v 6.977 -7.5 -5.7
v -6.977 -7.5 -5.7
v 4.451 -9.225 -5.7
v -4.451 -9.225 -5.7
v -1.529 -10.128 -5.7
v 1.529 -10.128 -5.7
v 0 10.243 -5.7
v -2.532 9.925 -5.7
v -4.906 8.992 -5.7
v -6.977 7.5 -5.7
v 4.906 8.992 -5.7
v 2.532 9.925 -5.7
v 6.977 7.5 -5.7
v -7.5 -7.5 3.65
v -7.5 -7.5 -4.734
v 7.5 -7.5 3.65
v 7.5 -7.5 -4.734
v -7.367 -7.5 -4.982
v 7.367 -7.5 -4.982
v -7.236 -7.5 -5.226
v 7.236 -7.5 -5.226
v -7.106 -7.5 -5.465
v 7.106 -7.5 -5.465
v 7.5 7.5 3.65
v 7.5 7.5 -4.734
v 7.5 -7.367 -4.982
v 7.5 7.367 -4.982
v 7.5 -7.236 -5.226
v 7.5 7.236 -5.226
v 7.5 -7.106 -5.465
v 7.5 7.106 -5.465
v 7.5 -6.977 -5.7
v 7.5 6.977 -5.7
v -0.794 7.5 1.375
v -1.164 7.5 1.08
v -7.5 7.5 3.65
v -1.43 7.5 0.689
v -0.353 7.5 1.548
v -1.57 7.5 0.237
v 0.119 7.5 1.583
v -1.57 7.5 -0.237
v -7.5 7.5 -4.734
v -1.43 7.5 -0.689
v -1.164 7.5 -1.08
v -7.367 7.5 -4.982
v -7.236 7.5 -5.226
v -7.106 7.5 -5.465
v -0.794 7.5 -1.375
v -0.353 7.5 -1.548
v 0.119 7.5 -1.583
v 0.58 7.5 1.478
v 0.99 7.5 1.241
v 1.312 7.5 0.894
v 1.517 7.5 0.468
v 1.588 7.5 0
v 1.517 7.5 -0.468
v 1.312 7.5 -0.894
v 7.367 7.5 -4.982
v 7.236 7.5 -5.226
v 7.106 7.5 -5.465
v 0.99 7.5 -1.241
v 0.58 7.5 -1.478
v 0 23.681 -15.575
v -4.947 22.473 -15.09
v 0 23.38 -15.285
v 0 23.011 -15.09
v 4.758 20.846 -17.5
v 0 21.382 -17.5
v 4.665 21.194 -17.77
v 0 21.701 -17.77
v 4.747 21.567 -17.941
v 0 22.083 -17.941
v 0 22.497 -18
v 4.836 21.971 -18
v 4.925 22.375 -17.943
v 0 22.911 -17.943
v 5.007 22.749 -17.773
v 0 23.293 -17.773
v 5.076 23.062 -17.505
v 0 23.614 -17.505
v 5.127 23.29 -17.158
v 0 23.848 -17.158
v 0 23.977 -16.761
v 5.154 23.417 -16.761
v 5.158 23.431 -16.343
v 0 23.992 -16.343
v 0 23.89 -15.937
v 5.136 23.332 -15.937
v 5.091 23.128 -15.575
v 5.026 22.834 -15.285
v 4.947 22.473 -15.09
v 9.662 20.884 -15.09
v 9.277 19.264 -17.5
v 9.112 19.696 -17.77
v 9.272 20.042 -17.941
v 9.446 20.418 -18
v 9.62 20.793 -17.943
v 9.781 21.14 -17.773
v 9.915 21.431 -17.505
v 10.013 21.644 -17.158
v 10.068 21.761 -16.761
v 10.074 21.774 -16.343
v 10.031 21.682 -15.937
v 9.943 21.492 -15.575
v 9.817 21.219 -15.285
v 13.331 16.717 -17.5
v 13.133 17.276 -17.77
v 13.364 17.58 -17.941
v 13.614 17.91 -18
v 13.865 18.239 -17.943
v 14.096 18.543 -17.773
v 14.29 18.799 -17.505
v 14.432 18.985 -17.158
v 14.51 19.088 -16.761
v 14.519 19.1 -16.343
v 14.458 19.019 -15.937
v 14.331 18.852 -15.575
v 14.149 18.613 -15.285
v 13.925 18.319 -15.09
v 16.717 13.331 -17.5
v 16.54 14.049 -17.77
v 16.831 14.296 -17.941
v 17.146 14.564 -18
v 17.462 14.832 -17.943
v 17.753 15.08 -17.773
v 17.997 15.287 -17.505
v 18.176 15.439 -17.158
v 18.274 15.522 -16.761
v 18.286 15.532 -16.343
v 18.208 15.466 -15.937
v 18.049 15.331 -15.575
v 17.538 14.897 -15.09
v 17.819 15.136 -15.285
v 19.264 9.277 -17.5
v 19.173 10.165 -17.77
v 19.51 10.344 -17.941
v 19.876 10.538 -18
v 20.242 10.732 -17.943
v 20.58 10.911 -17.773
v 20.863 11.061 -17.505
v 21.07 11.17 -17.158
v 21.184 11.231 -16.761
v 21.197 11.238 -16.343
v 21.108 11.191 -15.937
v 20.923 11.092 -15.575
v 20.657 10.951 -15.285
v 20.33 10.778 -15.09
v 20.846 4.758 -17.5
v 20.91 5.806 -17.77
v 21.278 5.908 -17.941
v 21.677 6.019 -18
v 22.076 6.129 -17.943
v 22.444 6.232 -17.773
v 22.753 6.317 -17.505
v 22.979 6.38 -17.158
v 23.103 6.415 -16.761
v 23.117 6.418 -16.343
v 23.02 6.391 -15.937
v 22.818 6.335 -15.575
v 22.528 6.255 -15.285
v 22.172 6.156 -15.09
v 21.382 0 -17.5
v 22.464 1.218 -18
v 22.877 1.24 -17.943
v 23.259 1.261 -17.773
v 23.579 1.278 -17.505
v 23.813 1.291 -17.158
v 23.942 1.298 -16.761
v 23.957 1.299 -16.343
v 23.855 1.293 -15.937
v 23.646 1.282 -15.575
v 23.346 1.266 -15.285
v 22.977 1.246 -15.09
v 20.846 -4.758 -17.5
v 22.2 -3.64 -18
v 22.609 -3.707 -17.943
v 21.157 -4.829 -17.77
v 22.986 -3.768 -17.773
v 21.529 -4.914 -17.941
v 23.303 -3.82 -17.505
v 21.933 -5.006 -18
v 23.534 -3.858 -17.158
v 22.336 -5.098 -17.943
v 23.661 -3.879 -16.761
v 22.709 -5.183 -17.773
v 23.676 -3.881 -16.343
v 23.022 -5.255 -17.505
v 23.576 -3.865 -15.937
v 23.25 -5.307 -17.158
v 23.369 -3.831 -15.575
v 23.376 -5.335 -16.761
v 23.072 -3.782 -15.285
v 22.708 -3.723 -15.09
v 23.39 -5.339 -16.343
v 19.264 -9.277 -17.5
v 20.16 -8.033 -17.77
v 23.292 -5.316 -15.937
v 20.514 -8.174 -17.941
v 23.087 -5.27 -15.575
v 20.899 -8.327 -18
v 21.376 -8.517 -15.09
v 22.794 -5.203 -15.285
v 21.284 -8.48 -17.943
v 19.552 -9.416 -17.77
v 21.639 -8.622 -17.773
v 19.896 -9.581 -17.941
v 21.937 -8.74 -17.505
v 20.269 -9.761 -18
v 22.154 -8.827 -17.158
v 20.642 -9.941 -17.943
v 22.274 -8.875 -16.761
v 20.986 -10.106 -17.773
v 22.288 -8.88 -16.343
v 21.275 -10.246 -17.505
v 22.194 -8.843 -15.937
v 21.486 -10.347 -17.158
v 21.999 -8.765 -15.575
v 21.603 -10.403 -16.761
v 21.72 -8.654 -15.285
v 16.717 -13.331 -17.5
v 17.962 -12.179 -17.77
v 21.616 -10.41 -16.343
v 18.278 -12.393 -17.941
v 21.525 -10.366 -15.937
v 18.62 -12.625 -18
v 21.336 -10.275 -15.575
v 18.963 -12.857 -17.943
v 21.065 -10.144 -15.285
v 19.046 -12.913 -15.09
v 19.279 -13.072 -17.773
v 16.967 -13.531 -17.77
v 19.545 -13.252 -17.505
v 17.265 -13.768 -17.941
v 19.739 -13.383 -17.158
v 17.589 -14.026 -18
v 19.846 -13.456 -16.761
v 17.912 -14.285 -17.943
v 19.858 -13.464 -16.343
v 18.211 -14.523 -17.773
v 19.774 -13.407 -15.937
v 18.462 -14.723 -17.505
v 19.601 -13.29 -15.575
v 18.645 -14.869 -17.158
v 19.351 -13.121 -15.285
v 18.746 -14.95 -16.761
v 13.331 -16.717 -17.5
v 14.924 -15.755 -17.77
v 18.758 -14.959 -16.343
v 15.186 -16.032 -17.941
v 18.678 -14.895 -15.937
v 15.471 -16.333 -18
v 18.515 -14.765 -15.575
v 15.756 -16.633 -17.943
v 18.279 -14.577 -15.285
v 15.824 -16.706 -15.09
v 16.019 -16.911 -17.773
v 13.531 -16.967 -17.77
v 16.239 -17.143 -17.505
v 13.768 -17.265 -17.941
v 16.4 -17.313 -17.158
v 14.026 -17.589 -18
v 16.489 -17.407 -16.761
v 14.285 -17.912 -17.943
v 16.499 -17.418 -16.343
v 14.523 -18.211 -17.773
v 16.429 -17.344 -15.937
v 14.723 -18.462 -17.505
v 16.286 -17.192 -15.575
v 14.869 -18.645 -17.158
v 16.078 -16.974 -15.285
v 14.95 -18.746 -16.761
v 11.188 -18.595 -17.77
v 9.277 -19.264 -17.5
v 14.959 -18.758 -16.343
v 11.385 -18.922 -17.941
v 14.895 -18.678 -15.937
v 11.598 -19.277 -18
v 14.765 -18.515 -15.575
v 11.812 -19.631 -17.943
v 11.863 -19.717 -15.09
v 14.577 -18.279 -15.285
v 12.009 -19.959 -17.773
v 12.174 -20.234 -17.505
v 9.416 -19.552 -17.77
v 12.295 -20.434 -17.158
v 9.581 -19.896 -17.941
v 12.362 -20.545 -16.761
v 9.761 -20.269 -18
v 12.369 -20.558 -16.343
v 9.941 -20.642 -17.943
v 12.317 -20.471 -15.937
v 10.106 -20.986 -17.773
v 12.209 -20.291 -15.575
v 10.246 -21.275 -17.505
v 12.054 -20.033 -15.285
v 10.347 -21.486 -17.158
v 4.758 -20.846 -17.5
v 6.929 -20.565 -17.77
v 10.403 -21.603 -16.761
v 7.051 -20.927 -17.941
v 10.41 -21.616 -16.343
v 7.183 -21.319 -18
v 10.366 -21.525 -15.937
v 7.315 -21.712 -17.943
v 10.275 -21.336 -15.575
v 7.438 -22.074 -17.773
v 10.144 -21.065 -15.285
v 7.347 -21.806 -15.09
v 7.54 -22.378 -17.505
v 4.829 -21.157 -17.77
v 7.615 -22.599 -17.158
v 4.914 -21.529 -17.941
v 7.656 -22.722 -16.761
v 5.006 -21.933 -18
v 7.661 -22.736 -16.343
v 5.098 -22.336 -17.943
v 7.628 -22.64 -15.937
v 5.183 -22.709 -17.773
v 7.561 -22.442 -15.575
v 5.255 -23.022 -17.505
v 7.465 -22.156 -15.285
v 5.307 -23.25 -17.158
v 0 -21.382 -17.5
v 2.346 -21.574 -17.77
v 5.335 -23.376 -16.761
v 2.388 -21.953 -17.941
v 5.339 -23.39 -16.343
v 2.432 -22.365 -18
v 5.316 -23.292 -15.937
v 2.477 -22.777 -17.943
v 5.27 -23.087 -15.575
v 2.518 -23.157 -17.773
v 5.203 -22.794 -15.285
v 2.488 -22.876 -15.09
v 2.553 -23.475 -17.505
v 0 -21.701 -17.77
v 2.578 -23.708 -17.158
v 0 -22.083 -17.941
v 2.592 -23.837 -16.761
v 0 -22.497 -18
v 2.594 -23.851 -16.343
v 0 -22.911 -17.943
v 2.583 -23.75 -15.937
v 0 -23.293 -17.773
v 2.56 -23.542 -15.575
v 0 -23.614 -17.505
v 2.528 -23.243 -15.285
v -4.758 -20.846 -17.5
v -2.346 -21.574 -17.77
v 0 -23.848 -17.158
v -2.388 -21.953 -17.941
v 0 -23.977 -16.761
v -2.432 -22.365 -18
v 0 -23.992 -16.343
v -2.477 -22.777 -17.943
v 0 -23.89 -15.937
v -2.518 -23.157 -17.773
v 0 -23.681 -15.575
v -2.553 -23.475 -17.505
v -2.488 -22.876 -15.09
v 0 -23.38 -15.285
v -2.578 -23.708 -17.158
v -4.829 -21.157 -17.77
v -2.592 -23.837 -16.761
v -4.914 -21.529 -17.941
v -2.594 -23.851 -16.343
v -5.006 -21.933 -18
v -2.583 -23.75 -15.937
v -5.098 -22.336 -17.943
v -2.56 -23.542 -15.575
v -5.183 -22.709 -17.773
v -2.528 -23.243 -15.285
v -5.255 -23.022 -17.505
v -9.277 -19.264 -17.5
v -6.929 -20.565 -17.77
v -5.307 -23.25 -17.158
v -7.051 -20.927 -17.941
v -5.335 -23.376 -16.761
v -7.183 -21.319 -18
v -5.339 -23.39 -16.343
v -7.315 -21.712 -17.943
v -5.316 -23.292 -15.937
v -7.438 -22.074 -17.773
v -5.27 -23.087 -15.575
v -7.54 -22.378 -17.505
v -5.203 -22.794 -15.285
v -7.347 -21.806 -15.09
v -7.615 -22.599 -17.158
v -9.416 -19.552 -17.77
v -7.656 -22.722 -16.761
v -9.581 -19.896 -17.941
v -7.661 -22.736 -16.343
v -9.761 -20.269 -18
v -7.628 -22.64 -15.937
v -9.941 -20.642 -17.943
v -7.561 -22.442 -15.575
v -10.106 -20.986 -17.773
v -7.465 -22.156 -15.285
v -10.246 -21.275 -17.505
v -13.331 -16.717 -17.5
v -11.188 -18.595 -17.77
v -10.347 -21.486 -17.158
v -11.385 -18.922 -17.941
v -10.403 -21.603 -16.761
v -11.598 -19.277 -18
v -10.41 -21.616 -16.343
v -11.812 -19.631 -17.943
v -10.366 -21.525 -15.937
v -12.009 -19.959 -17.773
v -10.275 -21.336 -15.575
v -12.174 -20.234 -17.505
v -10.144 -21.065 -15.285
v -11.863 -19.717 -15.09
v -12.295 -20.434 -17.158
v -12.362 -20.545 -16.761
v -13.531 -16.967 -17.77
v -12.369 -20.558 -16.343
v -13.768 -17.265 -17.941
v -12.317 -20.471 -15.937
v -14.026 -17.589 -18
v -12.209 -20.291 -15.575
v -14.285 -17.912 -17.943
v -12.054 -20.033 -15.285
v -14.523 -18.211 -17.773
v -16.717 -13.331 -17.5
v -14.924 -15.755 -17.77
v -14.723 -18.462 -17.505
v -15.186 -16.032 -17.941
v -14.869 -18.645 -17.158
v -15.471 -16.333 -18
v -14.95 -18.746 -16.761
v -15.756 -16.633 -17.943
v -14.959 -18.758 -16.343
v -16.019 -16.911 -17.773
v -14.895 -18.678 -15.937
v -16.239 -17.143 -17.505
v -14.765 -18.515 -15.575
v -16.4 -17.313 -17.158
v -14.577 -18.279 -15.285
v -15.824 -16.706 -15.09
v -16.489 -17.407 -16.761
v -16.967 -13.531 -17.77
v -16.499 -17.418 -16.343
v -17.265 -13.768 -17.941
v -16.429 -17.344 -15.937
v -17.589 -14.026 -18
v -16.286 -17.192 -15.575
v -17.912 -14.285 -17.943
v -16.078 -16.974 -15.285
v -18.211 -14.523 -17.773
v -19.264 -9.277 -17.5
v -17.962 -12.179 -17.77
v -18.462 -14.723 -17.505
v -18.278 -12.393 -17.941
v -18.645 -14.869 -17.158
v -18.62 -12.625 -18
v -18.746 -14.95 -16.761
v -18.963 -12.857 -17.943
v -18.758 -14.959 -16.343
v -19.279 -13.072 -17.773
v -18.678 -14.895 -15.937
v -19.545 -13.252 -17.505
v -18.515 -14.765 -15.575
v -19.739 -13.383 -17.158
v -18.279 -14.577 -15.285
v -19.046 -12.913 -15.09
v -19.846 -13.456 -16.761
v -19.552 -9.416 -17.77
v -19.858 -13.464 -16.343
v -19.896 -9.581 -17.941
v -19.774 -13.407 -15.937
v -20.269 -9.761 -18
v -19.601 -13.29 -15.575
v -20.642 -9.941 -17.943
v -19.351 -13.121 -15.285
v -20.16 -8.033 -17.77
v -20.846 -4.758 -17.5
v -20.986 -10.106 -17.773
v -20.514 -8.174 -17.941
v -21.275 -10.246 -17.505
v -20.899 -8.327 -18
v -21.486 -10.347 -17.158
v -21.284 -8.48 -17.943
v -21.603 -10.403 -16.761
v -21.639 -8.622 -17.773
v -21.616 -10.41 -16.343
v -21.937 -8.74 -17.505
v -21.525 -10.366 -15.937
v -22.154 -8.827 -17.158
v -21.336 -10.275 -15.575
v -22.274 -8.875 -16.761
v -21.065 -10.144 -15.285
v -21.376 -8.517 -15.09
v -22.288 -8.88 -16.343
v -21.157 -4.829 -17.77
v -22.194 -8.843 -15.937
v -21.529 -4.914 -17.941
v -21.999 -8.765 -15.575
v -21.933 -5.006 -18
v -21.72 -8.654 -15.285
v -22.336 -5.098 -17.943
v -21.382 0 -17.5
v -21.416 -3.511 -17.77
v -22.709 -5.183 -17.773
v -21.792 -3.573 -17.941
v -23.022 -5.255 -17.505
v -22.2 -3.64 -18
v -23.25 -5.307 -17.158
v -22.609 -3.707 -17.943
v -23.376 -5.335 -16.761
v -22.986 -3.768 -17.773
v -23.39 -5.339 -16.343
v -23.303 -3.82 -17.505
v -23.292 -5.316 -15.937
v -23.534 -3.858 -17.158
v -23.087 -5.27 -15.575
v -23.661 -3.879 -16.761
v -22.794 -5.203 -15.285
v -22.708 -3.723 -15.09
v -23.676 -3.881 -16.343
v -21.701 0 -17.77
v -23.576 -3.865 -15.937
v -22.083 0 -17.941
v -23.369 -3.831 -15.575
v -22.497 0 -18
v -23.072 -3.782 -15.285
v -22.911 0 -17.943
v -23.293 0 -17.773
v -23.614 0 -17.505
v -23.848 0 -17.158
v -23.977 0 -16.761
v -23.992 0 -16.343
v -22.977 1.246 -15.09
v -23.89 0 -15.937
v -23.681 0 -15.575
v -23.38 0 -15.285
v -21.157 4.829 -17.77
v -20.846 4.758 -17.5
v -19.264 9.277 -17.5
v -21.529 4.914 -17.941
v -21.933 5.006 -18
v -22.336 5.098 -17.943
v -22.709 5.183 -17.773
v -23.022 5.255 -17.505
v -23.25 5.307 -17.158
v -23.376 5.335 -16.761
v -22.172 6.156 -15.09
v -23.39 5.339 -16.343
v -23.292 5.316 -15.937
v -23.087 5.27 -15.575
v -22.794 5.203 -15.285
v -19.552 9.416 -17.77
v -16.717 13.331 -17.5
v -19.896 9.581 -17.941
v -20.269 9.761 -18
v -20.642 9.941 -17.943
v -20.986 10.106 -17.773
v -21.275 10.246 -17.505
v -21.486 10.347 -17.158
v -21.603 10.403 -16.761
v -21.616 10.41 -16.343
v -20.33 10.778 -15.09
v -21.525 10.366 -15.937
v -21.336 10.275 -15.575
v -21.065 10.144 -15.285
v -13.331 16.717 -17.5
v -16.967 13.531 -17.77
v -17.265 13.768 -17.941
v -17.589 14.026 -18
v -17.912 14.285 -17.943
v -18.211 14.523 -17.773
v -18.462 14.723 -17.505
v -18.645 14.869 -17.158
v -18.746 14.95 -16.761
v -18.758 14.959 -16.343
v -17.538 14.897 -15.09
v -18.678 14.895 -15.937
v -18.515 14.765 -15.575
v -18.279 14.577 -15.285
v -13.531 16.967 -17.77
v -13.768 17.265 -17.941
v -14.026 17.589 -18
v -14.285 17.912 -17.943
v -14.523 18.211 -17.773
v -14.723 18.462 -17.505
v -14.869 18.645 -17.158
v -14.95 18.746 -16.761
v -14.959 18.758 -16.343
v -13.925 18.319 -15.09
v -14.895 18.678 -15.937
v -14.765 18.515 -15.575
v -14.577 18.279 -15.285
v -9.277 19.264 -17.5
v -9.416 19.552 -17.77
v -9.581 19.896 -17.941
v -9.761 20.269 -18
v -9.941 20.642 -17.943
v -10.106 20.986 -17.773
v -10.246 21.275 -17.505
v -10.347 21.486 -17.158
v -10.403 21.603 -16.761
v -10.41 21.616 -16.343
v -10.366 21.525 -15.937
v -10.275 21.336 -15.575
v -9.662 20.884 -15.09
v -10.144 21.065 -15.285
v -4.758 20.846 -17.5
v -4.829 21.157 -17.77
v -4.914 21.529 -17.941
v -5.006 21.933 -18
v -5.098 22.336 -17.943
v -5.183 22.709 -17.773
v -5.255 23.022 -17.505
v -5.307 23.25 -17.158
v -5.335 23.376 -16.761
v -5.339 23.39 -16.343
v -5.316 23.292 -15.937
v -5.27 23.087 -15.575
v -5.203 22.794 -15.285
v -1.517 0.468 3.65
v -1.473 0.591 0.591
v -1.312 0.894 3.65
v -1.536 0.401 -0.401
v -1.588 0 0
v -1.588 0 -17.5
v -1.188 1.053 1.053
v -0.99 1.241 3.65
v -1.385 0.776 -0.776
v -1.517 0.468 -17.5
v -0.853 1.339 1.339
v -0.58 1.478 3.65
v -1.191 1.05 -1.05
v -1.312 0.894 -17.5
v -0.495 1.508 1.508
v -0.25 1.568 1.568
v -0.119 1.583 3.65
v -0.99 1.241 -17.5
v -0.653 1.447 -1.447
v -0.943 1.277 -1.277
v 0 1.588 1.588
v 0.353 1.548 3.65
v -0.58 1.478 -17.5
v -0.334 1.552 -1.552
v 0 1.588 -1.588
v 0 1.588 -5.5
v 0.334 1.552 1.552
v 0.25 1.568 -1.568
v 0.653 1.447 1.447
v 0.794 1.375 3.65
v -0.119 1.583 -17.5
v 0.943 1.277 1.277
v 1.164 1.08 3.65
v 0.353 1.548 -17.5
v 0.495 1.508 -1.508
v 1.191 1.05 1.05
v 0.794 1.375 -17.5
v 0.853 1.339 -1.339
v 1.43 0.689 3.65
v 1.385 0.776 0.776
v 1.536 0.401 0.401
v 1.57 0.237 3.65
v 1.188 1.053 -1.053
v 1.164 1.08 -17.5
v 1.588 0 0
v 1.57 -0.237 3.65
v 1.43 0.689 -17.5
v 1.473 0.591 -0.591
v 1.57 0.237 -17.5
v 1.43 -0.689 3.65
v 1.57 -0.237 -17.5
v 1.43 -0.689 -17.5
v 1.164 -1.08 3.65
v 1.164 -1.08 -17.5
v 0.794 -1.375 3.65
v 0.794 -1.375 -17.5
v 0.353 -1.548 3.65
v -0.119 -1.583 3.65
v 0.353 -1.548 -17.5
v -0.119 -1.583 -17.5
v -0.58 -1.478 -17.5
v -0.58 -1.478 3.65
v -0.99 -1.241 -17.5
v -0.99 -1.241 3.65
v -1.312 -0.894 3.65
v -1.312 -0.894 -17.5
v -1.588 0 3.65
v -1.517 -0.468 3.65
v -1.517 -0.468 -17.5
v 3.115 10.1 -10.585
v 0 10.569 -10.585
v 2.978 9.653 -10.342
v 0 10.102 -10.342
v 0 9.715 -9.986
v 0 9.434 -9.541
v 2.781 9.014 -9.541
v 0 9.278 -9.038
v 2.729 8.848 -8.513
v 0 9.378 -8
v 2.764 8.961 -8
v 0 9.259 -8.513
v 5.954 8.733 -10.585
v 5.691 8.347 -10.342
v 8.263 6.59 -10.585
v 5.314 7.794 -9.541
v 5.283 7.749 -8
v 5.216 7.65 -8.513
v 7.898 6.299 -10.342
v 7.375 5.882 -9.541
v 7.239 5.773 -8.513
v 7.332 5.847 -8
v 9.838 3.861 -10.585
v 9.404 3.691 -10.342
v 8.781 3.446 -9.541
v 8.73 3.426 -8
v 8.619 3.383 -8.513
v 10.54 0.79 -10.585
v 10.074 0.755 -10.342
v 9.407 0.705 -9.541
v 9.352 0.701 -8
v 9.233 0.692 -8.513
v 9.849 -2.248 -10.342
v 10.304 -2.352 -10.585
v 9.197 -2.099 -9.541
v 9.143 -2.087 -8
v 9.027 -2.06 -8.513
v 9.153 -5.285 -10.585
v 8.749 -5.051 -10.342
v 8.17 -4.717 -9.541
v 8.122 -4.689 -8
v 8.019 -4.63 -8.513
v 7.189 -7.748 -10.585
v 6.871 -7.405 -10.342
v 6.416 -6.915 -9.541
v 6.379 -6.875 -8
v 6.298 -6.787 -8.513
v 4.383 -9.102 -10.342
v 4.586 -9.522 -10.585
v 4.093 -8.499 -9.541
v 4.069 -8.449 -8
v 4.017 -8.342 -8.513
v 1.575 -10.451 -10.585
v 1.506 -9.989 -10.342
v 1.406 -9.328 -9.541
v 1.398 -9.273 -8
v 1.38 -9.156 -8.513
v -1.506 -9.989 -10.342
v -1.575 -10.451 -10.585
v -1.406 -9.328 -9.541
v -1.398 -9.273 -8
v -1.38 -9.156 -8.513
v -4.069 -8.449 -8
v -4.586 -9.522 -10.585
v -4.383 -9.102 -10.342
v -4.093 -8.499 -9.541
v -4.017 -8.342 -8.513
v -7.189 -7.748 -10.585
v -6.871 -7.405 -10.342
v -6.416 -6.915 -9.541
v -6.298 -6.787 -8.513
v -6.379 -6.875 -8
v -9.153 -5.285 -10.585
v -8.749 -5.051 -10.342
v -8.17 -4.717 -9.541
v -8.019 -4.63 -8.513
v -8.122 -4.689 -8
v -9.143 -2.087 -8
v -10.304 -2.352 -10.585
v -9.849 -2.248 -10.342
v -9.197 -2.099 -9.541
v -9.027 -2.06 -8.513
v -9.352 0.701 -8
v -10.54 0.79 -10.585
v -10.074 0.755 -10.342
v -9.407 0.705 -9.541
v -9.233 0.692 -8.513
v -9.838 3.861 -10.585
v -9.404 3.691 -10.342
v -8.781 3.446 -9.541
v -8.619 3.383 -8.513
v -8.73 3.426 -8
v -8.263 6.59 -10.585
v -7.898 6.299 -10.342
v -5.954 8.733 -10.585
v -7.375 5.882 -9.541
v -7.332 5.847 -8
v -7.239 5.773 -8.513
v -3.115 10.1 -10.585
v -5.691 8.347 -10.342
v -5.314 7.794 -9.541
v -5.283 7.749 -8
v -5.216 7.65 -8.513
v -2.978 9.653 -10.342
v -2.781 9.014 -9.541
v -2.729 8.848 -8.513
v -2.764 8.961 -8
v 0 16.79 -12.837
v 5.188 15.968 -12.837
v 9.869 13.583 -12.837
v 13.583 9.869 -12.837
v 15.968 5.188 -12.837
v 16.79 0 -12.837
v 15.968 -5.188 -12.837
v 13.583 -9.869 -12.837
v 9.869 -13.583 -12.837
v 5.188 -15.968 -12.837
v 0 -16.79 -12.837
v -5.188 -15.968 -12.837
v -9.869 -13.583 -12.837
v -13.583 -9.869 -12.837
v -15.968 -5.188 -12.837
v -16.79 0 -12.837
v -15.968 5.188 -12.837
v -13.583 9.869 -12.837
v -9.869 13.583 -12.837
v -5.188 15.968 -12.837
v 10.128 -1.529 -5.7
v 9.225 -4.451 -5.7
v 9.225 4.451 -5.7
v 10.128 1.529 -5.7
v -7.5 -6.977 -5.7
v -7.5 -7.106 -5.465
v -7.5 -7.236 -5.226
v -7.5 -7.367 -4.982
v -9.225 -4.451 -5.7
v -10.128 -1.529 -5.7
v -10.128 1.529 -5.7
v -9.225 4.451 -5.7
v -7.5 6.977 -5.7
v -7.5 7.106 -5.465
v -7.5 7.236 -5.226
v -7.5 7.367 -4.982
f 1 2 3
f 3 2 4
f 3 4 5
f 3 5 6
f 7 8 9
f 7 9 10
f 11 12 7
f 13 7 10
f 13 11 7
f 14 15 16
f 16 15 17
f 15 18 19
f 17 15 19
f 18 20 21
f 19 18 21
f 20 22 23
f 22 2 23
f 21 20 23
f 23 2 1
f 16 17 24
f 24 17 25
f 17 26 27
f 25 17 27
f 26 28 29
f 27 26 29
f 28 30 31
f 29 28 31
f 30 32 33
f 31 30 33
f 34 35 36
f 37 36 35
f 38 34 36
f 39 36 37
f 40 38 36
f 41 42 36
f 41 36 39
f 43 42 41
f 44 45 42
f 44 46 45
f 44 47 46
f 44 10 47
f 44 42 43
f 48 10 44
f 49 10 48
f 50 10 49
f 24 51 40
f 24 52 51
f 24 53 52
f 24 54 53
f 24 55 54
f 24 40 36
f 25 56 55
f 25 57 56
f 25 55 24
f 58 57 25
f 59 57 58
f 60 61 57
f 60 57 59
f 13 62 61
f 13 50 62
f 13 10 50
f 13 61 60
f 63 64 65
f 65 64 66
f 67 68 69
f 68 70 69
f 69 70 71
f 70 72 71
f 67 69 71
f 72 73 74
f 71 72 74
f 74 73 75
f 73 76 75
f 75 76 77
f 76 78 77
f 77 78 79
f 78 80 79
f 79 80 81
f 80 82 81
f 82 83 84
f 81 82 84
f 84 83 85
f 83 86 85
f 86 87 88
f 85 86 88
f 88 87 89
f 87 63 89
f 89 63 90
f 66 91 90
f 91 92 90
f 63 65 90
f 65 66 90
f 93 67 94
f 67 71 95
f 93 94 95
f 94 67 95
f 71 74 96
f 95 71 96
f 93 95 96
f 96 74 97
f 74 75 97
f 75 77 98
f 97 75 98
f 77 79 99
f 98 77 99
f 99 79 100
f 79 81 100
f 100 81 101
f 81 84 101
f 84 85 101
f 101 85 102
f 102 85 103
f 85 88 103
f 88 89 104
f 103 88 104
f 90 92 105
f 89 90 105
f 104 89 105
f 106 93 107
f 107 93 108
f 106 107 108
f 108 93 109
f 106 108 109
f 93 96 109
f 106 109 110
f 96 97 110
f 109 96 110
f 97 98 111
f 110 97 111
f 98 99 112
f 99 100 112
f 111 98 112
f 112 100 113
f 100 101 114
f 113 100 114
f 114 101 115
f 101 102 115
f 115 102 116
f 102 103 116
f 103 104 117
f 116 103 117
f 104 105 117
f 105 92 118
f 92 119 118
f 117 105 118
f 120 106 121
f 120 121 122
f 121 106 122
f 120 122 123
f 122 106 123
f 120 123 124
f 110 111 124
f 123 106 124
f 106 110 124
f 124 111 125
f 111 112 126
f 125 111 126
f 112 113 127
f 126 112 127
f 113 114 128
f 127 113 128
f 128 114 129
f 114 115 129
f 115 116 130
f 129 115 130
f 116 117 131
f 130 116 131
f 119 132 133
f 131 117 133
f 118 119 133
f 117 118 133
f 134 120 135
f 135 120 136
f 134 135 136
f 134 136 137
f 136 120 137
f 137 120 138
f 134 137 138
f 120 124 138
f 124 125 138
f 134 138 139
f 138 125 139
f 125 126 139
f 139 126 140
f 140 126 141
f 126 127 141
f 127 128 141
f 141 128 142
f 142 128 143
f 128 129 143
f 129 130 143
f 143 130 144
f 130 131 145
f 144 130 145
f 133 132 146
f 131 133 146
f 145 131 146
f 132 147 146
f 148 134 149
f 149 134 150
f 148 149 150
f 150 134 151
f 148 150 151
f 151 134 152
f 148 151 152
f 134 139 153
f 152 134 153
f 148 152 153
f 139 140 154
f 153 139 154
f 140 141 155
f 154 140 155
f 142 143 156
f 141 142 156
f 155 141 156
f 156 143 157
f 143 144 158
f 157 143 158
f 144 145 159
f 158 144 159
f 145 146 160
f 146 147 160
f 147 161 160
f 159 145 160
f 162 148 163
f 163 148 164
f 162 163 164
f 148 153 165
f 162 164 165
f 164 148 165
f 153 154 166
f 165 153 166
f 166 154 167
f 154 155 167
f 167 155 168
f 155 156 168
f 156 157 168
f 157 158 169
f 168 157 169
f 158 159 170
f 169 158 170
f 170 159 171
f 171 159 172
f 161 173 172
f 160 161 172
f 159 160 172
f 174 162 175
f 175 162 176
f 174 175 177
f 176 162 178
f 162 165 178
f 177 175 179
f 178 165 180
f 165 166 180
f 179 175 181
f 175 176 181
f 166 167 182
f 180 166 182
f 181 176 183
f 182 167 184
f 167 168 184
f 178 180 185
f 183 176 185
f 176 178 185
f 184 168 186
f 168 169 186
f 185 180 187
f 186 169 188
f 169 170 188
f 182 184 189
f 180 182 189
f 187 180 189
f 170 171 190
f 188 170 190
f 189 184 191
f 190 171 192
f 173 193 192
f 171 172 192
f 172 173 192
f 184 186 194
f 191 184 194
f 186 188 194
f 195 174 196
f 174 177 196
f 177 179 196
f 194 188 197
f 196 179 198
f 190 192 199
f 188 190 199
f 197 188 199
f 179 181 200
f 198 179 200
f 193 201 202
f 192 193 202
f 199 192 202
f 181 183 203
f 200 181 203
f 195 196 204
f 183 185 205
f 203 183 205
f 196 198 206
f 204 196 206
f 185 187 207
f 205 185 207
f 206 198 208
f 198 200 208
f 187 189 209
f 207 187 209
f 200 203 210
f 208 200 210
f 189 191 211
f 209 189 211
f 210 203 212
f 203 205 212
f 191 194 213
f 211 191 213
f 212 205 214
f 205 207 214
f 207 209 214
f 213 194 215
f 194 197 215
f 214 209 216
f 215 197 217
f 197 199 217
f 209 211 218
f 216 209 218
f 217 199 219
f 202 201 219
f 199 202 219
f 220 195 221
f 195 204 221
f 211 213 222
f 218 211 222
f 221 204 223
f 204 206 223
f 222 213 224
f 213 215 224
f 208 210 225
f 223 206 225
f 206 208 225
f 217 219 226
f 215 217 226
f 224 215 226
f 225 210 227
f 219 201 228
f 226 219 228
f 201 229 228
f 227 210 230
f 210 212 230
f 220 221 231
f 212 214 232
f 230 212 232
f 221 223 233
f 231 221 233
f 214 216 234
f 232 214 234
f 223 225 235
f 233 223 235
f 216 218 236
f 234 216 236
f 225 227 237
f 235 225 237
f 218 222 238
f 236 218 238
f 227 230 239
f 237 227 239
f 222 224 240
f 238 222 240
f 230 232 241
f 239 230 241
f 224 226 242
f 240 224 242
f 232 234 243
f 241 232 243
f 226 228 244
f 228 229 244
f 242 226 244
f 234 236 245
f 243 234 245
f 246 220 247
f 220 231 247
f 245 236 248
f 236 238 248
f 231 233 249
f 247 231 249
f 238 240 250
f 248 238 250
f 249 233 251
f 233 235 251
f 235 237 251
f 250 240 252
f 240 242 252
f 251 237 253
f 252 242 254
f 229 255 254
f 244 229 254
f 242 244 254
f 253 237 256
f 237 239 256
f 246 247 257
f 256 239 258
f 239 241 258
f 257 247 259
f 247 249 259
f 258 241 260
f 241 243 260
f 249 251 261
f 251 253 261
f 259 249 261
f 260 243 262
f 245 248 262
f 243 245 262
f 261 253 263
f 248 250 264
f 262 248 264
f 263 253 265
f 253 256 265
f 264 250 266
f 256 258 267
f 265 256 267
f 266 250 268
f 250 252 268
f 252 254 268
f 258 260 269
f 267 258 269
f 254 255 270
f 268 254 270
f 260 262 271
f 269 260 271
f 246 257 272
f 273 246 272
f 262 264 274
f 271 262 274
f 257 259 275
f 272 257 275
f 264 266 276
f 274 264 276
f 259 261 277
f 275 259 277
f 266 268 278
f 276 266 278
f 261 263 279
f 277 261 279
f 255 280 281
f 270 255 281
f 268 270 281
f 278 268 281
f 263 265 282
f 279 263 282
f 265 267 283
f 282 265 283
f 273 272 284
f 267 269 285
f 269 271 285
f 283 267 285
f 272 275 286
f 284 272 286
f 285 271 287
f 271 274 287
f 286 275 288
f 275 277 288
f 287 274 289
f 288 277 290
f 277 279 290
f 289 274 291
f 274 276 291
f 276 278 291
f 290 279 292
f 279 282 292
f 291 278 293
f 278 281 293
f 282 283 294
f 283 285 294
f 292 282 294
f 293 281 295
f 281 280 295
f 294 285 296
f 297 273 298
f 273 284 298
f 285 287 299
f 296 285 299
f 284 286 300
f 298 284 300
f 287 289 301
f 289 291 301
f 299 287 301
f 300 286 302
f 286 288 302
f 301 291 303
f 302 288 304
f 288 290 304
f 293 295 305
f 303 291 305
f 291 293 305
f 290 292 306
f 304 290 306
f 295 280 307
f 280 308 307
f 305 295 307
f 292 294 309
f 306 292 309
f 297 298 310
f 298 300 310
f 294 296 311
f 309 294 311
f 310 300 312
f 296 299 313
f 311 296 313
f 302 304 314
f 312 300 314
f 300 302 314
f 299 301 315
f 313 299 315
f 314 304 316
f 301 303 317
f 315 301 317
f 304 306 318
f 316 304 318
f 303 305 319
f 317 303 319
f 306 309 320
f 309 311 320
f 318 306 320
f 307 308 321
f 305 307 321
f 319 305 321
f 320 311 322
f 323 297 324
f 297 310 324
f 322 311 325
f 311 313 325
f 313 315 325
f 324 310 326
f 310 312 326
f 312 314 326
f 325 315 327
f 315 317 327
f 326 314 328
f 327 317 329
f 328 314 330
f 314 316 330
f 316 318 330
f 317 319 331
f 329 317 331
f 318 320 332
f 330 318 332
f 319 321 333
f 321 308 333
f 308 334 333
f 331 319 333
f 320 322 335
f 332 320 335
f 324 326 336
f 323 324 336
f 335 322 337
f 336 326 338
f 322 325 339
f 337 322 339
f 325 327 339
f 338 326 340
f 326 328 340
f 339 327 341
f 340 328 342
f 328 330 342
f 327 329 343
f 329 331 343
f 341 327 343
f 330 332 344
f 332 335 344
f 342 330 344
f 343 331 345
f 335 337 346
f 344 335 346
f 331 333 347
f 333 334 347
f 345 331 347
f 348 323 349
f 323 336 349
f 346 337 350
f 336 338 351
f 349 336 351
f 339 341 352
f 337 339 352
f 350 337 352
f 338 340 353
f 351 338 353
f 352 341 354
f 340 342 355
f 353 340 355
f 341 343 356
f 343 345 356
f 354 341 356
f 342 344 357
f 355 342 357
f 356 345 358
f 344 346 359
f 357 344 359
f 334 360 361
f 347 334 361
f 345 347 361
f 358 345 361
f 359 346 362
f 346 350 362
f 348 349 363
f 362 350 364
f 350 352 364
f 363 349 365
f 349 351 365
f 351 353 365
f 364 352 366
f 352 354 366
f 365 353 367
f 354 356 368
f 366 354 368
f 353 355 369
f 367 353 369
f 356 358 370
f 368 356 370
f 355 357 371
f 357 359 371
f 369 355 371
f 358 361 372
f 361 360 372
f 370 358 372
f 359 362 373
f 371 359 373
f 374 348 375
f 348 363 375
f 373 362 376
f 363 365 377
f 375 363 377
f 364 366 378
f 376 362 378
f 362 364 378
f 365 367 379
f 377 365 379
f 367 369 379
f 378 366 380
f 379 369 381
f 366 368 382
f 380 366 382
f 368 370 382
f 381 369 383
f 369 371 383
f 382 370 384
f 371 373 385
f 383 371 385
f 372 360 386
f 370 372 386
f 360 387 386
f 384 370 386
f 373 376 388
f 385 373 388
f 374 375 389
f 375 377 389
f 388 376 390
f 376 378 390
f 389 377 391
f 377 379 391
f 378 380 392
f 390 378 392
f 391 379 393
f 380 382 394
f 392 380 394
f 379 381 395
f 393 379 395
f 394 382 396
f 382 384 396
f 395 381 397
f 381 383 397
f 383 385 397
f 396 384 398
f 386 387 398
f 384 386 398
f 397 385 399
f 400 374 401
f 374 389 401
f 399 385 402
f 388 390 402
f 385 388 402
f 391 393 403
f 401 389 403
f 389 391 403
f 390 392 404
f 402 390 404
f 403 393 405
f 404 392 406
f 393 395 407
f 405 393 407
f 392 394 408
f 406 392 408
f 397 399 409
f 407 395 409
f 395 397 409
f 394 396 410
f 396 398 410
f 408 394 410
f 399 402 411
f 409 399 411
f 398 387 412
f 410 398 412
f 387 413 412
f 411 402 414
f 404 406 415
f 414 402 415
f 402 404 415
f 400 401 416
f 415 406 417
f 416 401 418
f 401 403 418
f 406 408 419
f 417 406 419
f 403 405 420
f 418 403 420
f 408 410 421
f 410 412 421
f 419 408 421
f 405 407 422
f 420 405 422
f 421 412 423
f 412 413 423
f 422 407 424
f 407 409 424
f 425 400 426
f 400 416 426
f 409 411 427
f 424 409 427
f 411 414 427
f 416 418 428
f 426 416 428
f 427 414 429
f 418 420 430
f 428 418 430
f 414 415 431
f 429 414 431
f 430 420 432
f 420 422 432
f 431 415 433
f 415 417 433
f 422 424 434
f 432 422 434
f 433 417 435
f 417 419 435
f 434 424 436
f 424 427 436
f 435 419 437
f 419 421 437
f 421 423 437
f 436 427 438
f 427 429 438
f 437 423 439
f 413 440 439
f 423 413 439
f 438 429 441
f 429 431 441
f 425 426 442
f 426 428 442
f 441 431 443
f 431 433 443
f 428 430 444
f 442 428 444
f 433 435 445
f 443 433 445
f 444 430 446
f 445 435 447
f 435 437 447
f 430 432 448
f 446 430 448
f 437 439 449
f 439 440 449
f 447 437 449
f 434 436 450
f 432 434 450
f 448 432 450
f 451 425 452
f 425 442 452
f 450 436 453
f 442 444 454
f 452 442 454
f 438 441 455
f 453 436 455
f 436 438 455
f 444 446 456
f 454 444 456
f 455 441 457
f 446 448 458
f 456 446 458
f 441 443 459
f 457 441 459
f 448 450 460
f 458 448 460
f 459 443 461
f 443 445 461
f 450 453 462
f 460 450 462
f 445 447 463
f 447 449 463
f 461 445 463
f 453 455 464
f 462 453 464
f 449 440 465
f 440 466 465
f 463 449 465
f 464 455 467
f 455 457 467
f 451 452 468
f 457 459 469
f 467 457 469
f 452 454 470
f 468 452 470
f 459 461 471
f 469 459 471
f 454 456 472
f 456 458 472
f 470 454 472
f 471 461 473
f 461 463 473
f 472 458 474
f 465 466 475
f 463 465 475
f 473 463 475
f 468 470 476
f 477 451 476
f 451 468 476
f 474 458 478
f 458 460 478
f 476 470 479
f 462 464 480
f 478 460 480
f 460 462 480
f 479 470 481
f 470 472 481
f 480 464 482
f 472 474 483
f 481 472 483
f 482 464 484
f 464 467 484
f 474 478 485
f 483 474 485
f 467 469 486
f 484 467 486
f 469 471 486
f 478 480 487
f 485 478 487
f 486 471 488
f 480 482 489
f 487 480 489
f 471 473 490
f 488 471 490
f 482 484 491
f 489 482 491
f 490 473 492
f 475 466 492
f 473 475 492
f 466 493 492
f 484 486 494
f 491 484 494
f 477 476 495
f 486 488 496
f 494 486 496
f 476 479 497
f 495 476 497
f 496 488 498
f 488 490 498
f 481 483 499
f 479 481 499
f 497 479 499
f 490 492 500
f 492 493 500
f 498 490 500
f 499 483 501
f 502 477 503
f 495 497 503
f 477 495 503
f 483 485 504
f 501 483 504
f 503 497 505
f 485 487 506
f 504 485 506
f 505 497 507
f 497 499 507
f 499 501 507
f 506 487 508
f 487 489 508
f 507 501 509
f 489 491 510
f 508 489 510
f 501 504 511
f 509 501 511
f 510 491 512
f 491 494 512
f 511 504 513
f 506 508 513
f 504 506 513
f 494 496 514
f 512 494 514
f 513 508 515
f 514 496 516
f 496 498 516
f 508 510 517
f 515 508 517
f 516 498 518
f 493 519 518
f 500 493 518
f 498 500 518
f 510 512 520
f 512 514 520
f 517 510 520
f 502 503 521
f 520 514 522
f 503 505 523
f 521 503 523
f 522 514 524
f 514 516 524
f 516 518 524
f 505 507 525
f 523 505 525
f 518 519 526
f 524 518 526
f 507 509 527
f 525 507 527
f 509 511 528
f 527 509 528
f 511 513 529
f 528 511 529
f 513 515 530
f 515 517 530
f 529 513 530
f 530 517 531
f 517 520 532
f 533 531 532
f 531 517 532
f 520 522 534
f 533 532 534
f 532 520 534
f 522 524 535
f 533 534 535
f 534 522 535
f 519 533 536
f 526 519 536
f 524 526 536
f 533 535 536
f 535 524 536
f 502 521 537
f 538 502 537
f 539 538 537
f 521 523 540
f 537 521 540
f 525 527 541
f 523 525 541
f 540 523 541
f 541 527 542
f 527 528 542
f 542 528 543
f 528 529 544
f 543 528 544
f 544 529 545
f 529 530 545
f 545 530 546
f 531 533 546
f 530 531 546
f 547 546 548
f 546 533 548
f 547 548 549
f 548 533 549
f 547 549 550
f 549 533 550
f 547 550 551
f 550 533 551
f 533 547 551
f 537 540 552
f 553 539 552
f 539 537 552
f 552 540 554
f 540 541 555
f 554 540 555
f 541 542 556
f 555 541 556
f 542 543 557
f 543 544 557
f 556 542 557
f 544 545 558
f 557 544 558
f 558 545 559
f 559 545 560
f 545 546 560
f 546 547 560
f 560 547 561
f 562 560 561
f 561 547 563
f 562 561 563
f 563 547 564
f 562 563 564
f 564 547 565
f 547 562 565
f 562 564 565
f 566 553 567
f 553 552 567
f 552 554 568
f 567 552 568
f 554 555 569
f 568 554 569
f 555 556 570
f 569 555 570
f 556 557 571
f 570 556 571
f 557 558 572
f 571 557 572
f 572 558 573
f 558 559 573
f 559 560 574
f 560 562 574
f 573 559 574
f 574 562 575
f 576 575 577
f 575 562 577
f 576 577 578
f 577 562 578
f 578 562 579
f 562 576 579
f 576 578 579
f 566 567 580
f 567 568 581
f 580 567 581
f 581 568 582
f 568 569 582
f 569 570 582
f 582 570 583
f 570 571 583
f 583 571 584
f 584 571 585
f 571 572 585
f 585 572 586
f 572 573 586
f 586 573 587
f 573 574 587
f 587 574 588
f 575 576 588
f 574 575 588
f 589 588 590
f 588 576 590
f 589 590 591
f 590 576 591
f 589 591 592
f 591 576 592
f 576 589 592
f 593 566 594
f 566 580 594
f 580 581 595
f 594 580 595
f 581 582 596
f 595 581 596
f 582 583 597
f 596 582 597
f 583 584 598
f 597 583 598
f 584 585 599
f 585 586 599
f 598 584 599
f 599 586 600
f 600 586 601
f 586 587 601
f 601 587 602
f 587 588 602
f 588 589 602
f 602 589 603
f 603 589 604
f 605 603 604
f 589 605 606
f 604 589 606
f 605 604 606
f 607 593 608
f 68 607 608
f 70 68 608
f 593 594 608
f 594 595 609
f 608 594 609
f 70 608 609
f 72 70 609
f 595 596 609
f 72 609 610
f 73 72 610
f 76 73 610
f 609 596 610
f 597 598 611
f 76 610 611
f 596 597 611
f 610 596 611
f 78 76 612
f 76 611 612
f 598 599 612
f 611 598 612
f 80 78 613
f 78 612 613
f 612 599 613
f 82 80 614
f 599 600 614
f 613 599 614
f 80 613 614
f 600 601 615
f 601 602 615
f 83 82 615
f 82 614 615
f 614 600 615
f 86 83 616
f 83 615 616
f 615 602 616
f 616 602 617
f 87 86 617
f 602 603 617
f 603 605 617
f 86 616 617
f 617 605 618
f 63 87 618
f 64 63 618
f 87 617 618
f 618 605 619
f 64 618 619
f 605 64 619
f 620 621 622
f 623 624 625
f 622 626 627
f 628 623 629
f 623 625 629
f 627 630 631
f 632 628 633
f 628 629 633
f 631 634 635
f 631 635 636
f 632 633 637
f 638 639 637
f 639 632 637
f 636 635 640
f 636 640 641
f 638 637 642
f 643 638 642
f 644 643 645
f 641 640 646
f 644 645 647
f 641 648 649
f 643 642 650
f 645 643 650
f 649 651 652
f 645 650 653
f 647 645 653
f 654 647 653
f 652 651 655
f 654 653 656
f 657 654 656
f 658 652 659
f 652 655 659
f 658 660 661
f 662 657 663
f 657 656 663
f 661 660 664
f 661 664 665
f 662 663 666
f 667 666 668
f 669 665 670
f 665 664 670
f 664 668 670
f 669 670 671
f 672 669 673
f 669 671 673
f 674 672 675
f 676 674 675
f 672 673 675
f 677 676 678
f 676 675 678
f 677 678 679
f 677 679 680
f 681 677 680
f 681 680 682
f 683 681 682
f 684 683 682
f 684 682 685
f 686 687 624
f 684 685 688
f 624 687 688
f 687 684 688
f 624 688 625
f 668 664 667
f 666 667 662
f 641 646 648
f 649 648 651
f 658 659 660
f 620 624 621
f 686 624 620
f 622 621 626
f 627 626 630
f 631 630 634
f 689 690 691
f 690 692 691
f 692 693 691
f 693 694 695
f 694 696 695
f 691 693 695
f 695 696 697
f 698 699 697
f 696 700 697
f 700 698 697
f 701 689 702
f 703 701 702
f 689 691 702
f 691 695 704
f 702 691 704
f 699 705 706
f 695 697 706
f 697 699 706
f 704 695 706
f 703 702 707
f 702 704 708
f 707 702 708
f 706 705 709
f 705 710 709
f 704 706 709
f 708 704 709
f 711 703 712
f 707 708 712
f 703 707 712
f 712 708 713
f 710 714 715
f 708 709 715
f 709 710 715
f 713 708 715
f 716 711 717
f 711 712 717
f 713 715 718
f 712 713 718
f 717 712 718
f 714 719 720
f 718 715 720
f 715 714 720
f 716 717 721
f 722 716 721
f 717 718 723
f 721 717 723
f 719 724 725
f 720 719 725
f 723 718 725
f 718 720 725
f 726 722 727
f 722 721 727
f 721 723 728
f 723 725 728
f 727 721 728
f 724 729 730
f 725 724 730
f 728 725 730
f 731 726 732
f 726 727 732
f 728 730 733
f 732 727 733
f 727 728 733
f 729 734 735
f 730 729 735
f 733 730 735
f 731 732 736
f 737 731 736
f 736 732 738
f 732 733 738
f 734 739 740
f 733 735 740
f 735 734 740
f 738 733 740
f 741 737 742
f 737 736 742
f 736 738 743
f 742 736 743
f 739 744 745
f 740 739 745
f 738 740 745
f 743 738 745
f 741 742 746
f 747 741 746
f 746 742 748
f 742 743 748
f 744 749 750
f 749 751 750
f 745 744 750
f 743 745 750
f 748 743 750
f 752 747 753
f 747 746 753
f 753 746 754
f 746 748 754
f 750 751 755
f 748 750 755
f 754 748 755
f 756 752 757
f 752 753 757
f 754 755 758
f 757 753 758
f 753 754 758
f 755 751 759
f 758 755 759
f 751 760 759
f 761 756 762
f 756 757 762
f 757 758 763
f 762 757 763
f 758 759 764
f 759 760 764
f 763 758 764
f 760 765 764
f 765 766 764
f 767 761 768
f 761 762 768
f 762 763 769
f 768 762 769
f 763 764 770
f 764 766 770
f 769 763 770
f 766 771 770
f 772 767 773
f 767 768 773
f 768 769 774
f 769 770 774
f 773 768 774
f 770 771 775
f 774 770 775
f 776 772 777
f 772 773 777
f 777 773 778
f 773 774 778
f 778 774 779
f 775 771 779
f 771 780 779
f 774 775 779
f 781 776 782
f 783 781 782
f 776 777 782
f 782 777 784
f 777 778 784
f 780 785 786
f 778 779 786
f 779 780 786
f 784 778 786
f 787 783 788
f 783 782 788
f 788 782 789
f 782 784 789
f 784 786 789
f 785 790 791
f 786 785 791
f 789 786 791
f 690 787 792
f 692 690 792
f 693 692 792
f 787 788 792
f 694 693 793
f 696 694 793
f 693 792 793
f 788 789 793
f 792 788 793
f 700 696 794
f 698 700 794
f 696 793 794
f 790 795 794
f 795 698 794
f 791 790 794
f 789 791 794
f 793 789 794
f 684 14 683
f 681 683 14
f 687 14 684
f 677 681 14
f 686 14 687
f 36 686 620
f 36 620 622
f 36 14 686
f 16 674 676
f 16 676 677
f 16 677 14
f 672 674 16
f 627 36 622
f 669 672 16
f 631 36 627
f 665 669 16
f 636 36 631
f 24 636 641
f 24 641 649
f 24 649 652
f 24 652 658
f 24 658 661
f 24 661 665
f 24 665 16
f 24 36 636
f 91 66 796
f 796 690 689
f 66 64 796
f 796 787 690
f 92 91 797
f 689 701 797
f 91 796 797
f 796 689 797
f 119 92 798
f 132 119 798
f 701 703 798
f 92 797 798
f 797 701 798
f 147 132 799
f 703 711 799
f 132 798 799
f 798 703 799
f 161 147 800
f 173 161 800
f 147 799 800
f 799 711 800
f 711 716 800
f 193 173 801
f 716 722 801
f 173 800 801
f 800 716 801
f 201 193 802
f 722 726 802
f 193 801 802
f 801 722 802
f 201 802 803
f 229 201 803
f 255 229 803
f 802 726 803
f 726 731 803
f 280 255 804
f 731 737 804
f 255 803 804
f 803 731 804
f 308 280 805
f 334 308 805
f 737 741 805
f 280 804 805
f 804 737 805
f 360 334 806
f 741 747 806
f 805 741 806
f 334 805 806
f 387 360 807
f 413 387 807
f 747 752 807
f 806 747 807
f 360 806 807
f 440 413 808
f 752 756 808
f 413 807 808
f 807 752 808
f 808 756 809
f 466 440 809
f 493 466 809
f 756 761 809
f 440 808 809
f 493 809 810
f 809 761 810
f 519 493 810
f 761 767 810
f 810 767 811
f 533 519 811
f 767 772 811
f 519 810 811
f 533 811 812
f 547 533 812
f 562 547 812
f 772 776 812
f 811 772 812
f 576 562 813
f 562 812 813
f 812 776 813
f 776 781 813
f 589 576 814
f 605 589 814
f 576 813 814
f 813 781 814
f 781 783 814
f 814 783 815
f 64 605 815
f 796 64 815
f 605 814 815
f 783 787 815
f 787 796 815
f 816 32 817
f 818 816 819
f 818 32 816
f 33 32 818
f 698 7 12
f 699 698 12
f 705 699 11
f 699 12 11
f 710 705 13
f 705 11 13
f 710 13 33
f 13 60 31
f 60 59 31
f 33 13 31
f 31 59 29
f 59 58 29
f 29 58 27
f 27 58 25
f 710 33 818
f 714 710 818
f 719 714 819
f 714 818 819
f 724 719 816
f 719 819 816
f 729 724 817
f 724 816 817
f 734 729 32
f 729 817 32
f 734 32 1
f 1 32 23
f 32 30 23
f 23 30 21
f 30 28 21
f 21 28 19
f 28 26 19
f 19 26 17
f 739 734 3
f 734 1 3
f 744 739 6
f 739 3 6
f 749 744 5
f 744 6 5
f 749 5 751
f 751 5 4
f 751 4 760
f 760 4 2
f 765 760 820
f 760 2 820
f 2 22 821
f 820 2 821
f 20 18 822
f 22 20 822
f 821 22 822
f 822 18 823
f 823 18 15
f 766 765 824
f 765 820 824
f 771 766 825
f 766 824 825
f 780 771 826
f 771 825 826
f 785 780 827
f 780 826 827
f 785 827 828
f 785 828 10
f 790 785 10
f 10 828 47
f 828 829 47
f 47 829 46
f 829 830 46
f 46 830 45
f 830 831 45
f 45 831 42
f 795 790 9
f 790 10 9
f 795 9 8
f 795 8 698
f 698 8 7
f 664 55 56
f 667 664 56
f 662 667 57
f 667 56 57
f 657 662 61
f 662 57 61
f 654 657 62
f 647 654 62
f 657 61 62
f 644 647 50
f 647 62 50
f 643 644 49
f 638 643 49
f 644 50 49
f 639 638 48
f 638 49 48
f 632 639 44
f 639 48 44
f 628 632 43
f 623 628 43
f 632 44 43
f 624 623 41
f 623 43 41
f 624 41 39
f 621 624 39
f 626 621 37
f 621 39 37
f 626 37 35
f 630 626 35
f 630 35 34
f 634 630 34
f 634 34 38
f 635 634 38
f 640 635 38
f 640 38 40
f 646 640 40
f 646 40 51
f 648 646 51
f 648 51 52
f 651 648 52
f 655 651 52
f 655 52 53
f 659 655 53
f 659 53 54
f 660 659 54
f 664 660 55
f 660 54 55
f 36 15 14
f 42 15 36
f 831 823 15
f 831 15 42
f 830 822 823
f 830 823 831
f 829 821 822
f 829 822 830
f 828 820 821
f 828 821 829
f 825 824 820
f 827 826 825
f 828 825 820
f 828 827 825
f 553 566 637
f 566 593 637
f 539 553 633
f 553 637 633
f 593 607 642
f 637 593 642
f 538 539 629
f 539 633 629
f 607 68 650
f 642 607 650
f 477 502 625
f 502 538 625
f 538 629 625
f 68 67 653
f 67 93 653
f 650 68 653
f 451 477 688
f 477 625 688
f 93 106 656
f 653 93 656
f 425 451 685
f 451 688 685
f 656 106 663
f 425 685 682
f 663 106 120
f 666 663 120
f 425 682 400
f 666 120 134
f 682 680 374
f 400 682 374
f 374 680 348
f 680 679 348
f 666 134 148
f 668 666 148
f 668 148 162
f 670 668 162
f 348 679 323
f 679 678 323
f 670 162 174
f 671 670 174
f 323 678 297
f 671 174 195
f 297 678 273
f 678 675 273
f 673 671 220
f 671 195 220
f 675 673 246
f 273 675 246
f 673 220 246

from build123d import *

# Parameters (mm, degrees)
SKETCH3_R                      = 1.5875
CUT_EXTRUDE1_DEPTH             = 1.5000001
CUT_EXTRUDE1_DEPTH_BACK        = 34.456537644
CUT_EXTRUDE2_REACH             = 70.5
SKETCH5_R                      = 1.5875
CUT_EXTRUDE2_DIRECTION_2_DEPTH = 1
CUT_EXTRUDE3_START             = -5.7
SKETCH7_W                      = 73.641561492
SKETCH7_H                      = 95.167537828
SKETCH7_W_2                    = 15
SKETCH7_H_2                    = 15
CUT_EXTRUDE3_DEPTH             = 30
SKETCH8_W                      = 22.620718333
SKETCH8_H                      = 11.010276543
CUT_EXTRUDE4_DEPTH             = 19


with BuildPart() as part:
    # Sketch2 → Revolve1 (revolve)
    with BuildSketch(Plane(origin=(0, 0, 0), x_dir=(0, 0, -1), z_dir=(1, 0, 0))):
        with BuildLine():
            Line((8, 9.378044922), (-13.252418104, 17.371955078))
            ThreePointArc((-13.252418104, 17.371955078), (-15.64910376, 16.565466847), (-15.34, 14.055689912))
            ThreePointArc((-15.34, 14.055689912), (-10.902736423, 7.641374531), (-9.34, 0))
            Line((-9.34, 0), (17.5, 0))
            Line((17.5, 0), (17.5, 21.381966011))
            ThreePointArc((17.5, 21.381966011), (17.339814217, 23.742864466), (15.089610413, 23.010687001))
            Line((15.089610413, 23.010687001), (10.584638888, 10.569083998))
            ThreePointArc((10.584638888, 10.569083998), (9.541151557, 9.433581206), (8, 9.378044922))
        make_face()
    revolve(axis=Axis((0, 0, 9.34), (0, 0, -1)))

    # Sketch6 → Cut-Revolve1 (revolve, cut)
    with BuildSketch(Plane(origin=(0, 0, 0), x_dir=(1, 0, 0), z_dir=(0, 1, 0))):
        Polygon((-15.003814977, -6.956537544), (-14.995054438, -6.959832743), (-17.361955078, -13.252418104), (-17.371955078, -13.252418104), align=None)
    revolve(axis=Axis((0, 0, 0), (0, 0, 1)), mode=Mode.SUBTRACT)

    # Sketch3 → Cut-Extrude1 (cut, two sides)
    with BuildSketch(Plane(origin=(0, 0, -17.5), x_dir=(-1, 0, 0), z_dir=(0, 0, -1))) as cut_extrude1_sk:
        Circle(SKETCH3_R)
    extrude(amount=CUT_EXTRUDE1_DEPTH, mode=Mode.SUBTRACT)
    extrude(cut_extrude1_sk.sketch, amount=-CUT_EXTRUDE1_DEPTH_BACK, mode=Mode.SUBTRACT)

    # Sketch4 → Revolve2 (revolve)
    with BuildSketch(Plane.XY):
        Polygon((0, 1.5875), (5.5, 1.5875), (5.5, 28.5), (4.5, 28.5), (4, 32.5), (4.5, 32.5), (4, 36.5), (4.5, 36.5), (4, 40.5), (4.5, 40.5), (4, 44.5), (0, 44.5), (0, 28.5), align=None)
    revolve(axis=Axis((0, 0, 0), (0, 1, 0)))

    # Sketch5 → Cut-Extrude2 (cut, up to next)
    with BuildSketch(Plane(origin=(0, 44.5, 0), x_dir=(1, 0, 0), z_dir=(0, 1, 0)), mode=Mode.PRIVATE) as cut_extrude2_sk1:
        Circle(SKETCH5_R)
    cut_extrude2_tool1 = extrude(cut_extrude2_sk1.sketch, amount=-CUT_EXTRUDE2_REACH, mode=Mode.PRIVATE) & part.part
    add(cut_extrude2_tool1.solids().sort_by_distance((0, 44.5, 0))[0], mode=Mode.SUBTRACT)

    # Sketch5 → Cut-Extrude2 direction 2 (cut)
    with BuildSketch(Plane(origin=(0, 44.5, 0), x_dir=(1, 0, 0), z_dir=(0, 1, 0))):
        Circle(SKETCH5_R)
    extrude(amount=CUT_EXTRUDE2_DIRECTION_2_DEPTH, mode=Mode.SUBTRACT)

    # Sketch7 → Cut-Extrude3 (cut)
    with BuildSketch(Plane.XY.offset(CUT_EXTRUDE3_START)):
        Rectangle(SKETCH7_W, SKETCH7_H)
        Rectangle(SKETCH7_W_2, SKETCH7_H_2, mode=Mode.SUBTRACT)
    extrude(amount=CUT_EXTRUDE3_DEPTH, mode=Mode.SUBTRACT)

    # Sketch8 → Cut-Extrude4 (cut)
    with BuildSketch(Plane(origin=(0, 7.5, 0), x_dir=(1, 0, 0), z_dir=(0, 1, 0))):
        with Locations((2.733336799, -9.155138272)):
            Rectangle(SKETCH8_W, SKETCH8_H)
    extrude(amount=-CUT_EXTRUDE4_DEPTH, mode=Mode.SUBTRACT)


solid = part.part
